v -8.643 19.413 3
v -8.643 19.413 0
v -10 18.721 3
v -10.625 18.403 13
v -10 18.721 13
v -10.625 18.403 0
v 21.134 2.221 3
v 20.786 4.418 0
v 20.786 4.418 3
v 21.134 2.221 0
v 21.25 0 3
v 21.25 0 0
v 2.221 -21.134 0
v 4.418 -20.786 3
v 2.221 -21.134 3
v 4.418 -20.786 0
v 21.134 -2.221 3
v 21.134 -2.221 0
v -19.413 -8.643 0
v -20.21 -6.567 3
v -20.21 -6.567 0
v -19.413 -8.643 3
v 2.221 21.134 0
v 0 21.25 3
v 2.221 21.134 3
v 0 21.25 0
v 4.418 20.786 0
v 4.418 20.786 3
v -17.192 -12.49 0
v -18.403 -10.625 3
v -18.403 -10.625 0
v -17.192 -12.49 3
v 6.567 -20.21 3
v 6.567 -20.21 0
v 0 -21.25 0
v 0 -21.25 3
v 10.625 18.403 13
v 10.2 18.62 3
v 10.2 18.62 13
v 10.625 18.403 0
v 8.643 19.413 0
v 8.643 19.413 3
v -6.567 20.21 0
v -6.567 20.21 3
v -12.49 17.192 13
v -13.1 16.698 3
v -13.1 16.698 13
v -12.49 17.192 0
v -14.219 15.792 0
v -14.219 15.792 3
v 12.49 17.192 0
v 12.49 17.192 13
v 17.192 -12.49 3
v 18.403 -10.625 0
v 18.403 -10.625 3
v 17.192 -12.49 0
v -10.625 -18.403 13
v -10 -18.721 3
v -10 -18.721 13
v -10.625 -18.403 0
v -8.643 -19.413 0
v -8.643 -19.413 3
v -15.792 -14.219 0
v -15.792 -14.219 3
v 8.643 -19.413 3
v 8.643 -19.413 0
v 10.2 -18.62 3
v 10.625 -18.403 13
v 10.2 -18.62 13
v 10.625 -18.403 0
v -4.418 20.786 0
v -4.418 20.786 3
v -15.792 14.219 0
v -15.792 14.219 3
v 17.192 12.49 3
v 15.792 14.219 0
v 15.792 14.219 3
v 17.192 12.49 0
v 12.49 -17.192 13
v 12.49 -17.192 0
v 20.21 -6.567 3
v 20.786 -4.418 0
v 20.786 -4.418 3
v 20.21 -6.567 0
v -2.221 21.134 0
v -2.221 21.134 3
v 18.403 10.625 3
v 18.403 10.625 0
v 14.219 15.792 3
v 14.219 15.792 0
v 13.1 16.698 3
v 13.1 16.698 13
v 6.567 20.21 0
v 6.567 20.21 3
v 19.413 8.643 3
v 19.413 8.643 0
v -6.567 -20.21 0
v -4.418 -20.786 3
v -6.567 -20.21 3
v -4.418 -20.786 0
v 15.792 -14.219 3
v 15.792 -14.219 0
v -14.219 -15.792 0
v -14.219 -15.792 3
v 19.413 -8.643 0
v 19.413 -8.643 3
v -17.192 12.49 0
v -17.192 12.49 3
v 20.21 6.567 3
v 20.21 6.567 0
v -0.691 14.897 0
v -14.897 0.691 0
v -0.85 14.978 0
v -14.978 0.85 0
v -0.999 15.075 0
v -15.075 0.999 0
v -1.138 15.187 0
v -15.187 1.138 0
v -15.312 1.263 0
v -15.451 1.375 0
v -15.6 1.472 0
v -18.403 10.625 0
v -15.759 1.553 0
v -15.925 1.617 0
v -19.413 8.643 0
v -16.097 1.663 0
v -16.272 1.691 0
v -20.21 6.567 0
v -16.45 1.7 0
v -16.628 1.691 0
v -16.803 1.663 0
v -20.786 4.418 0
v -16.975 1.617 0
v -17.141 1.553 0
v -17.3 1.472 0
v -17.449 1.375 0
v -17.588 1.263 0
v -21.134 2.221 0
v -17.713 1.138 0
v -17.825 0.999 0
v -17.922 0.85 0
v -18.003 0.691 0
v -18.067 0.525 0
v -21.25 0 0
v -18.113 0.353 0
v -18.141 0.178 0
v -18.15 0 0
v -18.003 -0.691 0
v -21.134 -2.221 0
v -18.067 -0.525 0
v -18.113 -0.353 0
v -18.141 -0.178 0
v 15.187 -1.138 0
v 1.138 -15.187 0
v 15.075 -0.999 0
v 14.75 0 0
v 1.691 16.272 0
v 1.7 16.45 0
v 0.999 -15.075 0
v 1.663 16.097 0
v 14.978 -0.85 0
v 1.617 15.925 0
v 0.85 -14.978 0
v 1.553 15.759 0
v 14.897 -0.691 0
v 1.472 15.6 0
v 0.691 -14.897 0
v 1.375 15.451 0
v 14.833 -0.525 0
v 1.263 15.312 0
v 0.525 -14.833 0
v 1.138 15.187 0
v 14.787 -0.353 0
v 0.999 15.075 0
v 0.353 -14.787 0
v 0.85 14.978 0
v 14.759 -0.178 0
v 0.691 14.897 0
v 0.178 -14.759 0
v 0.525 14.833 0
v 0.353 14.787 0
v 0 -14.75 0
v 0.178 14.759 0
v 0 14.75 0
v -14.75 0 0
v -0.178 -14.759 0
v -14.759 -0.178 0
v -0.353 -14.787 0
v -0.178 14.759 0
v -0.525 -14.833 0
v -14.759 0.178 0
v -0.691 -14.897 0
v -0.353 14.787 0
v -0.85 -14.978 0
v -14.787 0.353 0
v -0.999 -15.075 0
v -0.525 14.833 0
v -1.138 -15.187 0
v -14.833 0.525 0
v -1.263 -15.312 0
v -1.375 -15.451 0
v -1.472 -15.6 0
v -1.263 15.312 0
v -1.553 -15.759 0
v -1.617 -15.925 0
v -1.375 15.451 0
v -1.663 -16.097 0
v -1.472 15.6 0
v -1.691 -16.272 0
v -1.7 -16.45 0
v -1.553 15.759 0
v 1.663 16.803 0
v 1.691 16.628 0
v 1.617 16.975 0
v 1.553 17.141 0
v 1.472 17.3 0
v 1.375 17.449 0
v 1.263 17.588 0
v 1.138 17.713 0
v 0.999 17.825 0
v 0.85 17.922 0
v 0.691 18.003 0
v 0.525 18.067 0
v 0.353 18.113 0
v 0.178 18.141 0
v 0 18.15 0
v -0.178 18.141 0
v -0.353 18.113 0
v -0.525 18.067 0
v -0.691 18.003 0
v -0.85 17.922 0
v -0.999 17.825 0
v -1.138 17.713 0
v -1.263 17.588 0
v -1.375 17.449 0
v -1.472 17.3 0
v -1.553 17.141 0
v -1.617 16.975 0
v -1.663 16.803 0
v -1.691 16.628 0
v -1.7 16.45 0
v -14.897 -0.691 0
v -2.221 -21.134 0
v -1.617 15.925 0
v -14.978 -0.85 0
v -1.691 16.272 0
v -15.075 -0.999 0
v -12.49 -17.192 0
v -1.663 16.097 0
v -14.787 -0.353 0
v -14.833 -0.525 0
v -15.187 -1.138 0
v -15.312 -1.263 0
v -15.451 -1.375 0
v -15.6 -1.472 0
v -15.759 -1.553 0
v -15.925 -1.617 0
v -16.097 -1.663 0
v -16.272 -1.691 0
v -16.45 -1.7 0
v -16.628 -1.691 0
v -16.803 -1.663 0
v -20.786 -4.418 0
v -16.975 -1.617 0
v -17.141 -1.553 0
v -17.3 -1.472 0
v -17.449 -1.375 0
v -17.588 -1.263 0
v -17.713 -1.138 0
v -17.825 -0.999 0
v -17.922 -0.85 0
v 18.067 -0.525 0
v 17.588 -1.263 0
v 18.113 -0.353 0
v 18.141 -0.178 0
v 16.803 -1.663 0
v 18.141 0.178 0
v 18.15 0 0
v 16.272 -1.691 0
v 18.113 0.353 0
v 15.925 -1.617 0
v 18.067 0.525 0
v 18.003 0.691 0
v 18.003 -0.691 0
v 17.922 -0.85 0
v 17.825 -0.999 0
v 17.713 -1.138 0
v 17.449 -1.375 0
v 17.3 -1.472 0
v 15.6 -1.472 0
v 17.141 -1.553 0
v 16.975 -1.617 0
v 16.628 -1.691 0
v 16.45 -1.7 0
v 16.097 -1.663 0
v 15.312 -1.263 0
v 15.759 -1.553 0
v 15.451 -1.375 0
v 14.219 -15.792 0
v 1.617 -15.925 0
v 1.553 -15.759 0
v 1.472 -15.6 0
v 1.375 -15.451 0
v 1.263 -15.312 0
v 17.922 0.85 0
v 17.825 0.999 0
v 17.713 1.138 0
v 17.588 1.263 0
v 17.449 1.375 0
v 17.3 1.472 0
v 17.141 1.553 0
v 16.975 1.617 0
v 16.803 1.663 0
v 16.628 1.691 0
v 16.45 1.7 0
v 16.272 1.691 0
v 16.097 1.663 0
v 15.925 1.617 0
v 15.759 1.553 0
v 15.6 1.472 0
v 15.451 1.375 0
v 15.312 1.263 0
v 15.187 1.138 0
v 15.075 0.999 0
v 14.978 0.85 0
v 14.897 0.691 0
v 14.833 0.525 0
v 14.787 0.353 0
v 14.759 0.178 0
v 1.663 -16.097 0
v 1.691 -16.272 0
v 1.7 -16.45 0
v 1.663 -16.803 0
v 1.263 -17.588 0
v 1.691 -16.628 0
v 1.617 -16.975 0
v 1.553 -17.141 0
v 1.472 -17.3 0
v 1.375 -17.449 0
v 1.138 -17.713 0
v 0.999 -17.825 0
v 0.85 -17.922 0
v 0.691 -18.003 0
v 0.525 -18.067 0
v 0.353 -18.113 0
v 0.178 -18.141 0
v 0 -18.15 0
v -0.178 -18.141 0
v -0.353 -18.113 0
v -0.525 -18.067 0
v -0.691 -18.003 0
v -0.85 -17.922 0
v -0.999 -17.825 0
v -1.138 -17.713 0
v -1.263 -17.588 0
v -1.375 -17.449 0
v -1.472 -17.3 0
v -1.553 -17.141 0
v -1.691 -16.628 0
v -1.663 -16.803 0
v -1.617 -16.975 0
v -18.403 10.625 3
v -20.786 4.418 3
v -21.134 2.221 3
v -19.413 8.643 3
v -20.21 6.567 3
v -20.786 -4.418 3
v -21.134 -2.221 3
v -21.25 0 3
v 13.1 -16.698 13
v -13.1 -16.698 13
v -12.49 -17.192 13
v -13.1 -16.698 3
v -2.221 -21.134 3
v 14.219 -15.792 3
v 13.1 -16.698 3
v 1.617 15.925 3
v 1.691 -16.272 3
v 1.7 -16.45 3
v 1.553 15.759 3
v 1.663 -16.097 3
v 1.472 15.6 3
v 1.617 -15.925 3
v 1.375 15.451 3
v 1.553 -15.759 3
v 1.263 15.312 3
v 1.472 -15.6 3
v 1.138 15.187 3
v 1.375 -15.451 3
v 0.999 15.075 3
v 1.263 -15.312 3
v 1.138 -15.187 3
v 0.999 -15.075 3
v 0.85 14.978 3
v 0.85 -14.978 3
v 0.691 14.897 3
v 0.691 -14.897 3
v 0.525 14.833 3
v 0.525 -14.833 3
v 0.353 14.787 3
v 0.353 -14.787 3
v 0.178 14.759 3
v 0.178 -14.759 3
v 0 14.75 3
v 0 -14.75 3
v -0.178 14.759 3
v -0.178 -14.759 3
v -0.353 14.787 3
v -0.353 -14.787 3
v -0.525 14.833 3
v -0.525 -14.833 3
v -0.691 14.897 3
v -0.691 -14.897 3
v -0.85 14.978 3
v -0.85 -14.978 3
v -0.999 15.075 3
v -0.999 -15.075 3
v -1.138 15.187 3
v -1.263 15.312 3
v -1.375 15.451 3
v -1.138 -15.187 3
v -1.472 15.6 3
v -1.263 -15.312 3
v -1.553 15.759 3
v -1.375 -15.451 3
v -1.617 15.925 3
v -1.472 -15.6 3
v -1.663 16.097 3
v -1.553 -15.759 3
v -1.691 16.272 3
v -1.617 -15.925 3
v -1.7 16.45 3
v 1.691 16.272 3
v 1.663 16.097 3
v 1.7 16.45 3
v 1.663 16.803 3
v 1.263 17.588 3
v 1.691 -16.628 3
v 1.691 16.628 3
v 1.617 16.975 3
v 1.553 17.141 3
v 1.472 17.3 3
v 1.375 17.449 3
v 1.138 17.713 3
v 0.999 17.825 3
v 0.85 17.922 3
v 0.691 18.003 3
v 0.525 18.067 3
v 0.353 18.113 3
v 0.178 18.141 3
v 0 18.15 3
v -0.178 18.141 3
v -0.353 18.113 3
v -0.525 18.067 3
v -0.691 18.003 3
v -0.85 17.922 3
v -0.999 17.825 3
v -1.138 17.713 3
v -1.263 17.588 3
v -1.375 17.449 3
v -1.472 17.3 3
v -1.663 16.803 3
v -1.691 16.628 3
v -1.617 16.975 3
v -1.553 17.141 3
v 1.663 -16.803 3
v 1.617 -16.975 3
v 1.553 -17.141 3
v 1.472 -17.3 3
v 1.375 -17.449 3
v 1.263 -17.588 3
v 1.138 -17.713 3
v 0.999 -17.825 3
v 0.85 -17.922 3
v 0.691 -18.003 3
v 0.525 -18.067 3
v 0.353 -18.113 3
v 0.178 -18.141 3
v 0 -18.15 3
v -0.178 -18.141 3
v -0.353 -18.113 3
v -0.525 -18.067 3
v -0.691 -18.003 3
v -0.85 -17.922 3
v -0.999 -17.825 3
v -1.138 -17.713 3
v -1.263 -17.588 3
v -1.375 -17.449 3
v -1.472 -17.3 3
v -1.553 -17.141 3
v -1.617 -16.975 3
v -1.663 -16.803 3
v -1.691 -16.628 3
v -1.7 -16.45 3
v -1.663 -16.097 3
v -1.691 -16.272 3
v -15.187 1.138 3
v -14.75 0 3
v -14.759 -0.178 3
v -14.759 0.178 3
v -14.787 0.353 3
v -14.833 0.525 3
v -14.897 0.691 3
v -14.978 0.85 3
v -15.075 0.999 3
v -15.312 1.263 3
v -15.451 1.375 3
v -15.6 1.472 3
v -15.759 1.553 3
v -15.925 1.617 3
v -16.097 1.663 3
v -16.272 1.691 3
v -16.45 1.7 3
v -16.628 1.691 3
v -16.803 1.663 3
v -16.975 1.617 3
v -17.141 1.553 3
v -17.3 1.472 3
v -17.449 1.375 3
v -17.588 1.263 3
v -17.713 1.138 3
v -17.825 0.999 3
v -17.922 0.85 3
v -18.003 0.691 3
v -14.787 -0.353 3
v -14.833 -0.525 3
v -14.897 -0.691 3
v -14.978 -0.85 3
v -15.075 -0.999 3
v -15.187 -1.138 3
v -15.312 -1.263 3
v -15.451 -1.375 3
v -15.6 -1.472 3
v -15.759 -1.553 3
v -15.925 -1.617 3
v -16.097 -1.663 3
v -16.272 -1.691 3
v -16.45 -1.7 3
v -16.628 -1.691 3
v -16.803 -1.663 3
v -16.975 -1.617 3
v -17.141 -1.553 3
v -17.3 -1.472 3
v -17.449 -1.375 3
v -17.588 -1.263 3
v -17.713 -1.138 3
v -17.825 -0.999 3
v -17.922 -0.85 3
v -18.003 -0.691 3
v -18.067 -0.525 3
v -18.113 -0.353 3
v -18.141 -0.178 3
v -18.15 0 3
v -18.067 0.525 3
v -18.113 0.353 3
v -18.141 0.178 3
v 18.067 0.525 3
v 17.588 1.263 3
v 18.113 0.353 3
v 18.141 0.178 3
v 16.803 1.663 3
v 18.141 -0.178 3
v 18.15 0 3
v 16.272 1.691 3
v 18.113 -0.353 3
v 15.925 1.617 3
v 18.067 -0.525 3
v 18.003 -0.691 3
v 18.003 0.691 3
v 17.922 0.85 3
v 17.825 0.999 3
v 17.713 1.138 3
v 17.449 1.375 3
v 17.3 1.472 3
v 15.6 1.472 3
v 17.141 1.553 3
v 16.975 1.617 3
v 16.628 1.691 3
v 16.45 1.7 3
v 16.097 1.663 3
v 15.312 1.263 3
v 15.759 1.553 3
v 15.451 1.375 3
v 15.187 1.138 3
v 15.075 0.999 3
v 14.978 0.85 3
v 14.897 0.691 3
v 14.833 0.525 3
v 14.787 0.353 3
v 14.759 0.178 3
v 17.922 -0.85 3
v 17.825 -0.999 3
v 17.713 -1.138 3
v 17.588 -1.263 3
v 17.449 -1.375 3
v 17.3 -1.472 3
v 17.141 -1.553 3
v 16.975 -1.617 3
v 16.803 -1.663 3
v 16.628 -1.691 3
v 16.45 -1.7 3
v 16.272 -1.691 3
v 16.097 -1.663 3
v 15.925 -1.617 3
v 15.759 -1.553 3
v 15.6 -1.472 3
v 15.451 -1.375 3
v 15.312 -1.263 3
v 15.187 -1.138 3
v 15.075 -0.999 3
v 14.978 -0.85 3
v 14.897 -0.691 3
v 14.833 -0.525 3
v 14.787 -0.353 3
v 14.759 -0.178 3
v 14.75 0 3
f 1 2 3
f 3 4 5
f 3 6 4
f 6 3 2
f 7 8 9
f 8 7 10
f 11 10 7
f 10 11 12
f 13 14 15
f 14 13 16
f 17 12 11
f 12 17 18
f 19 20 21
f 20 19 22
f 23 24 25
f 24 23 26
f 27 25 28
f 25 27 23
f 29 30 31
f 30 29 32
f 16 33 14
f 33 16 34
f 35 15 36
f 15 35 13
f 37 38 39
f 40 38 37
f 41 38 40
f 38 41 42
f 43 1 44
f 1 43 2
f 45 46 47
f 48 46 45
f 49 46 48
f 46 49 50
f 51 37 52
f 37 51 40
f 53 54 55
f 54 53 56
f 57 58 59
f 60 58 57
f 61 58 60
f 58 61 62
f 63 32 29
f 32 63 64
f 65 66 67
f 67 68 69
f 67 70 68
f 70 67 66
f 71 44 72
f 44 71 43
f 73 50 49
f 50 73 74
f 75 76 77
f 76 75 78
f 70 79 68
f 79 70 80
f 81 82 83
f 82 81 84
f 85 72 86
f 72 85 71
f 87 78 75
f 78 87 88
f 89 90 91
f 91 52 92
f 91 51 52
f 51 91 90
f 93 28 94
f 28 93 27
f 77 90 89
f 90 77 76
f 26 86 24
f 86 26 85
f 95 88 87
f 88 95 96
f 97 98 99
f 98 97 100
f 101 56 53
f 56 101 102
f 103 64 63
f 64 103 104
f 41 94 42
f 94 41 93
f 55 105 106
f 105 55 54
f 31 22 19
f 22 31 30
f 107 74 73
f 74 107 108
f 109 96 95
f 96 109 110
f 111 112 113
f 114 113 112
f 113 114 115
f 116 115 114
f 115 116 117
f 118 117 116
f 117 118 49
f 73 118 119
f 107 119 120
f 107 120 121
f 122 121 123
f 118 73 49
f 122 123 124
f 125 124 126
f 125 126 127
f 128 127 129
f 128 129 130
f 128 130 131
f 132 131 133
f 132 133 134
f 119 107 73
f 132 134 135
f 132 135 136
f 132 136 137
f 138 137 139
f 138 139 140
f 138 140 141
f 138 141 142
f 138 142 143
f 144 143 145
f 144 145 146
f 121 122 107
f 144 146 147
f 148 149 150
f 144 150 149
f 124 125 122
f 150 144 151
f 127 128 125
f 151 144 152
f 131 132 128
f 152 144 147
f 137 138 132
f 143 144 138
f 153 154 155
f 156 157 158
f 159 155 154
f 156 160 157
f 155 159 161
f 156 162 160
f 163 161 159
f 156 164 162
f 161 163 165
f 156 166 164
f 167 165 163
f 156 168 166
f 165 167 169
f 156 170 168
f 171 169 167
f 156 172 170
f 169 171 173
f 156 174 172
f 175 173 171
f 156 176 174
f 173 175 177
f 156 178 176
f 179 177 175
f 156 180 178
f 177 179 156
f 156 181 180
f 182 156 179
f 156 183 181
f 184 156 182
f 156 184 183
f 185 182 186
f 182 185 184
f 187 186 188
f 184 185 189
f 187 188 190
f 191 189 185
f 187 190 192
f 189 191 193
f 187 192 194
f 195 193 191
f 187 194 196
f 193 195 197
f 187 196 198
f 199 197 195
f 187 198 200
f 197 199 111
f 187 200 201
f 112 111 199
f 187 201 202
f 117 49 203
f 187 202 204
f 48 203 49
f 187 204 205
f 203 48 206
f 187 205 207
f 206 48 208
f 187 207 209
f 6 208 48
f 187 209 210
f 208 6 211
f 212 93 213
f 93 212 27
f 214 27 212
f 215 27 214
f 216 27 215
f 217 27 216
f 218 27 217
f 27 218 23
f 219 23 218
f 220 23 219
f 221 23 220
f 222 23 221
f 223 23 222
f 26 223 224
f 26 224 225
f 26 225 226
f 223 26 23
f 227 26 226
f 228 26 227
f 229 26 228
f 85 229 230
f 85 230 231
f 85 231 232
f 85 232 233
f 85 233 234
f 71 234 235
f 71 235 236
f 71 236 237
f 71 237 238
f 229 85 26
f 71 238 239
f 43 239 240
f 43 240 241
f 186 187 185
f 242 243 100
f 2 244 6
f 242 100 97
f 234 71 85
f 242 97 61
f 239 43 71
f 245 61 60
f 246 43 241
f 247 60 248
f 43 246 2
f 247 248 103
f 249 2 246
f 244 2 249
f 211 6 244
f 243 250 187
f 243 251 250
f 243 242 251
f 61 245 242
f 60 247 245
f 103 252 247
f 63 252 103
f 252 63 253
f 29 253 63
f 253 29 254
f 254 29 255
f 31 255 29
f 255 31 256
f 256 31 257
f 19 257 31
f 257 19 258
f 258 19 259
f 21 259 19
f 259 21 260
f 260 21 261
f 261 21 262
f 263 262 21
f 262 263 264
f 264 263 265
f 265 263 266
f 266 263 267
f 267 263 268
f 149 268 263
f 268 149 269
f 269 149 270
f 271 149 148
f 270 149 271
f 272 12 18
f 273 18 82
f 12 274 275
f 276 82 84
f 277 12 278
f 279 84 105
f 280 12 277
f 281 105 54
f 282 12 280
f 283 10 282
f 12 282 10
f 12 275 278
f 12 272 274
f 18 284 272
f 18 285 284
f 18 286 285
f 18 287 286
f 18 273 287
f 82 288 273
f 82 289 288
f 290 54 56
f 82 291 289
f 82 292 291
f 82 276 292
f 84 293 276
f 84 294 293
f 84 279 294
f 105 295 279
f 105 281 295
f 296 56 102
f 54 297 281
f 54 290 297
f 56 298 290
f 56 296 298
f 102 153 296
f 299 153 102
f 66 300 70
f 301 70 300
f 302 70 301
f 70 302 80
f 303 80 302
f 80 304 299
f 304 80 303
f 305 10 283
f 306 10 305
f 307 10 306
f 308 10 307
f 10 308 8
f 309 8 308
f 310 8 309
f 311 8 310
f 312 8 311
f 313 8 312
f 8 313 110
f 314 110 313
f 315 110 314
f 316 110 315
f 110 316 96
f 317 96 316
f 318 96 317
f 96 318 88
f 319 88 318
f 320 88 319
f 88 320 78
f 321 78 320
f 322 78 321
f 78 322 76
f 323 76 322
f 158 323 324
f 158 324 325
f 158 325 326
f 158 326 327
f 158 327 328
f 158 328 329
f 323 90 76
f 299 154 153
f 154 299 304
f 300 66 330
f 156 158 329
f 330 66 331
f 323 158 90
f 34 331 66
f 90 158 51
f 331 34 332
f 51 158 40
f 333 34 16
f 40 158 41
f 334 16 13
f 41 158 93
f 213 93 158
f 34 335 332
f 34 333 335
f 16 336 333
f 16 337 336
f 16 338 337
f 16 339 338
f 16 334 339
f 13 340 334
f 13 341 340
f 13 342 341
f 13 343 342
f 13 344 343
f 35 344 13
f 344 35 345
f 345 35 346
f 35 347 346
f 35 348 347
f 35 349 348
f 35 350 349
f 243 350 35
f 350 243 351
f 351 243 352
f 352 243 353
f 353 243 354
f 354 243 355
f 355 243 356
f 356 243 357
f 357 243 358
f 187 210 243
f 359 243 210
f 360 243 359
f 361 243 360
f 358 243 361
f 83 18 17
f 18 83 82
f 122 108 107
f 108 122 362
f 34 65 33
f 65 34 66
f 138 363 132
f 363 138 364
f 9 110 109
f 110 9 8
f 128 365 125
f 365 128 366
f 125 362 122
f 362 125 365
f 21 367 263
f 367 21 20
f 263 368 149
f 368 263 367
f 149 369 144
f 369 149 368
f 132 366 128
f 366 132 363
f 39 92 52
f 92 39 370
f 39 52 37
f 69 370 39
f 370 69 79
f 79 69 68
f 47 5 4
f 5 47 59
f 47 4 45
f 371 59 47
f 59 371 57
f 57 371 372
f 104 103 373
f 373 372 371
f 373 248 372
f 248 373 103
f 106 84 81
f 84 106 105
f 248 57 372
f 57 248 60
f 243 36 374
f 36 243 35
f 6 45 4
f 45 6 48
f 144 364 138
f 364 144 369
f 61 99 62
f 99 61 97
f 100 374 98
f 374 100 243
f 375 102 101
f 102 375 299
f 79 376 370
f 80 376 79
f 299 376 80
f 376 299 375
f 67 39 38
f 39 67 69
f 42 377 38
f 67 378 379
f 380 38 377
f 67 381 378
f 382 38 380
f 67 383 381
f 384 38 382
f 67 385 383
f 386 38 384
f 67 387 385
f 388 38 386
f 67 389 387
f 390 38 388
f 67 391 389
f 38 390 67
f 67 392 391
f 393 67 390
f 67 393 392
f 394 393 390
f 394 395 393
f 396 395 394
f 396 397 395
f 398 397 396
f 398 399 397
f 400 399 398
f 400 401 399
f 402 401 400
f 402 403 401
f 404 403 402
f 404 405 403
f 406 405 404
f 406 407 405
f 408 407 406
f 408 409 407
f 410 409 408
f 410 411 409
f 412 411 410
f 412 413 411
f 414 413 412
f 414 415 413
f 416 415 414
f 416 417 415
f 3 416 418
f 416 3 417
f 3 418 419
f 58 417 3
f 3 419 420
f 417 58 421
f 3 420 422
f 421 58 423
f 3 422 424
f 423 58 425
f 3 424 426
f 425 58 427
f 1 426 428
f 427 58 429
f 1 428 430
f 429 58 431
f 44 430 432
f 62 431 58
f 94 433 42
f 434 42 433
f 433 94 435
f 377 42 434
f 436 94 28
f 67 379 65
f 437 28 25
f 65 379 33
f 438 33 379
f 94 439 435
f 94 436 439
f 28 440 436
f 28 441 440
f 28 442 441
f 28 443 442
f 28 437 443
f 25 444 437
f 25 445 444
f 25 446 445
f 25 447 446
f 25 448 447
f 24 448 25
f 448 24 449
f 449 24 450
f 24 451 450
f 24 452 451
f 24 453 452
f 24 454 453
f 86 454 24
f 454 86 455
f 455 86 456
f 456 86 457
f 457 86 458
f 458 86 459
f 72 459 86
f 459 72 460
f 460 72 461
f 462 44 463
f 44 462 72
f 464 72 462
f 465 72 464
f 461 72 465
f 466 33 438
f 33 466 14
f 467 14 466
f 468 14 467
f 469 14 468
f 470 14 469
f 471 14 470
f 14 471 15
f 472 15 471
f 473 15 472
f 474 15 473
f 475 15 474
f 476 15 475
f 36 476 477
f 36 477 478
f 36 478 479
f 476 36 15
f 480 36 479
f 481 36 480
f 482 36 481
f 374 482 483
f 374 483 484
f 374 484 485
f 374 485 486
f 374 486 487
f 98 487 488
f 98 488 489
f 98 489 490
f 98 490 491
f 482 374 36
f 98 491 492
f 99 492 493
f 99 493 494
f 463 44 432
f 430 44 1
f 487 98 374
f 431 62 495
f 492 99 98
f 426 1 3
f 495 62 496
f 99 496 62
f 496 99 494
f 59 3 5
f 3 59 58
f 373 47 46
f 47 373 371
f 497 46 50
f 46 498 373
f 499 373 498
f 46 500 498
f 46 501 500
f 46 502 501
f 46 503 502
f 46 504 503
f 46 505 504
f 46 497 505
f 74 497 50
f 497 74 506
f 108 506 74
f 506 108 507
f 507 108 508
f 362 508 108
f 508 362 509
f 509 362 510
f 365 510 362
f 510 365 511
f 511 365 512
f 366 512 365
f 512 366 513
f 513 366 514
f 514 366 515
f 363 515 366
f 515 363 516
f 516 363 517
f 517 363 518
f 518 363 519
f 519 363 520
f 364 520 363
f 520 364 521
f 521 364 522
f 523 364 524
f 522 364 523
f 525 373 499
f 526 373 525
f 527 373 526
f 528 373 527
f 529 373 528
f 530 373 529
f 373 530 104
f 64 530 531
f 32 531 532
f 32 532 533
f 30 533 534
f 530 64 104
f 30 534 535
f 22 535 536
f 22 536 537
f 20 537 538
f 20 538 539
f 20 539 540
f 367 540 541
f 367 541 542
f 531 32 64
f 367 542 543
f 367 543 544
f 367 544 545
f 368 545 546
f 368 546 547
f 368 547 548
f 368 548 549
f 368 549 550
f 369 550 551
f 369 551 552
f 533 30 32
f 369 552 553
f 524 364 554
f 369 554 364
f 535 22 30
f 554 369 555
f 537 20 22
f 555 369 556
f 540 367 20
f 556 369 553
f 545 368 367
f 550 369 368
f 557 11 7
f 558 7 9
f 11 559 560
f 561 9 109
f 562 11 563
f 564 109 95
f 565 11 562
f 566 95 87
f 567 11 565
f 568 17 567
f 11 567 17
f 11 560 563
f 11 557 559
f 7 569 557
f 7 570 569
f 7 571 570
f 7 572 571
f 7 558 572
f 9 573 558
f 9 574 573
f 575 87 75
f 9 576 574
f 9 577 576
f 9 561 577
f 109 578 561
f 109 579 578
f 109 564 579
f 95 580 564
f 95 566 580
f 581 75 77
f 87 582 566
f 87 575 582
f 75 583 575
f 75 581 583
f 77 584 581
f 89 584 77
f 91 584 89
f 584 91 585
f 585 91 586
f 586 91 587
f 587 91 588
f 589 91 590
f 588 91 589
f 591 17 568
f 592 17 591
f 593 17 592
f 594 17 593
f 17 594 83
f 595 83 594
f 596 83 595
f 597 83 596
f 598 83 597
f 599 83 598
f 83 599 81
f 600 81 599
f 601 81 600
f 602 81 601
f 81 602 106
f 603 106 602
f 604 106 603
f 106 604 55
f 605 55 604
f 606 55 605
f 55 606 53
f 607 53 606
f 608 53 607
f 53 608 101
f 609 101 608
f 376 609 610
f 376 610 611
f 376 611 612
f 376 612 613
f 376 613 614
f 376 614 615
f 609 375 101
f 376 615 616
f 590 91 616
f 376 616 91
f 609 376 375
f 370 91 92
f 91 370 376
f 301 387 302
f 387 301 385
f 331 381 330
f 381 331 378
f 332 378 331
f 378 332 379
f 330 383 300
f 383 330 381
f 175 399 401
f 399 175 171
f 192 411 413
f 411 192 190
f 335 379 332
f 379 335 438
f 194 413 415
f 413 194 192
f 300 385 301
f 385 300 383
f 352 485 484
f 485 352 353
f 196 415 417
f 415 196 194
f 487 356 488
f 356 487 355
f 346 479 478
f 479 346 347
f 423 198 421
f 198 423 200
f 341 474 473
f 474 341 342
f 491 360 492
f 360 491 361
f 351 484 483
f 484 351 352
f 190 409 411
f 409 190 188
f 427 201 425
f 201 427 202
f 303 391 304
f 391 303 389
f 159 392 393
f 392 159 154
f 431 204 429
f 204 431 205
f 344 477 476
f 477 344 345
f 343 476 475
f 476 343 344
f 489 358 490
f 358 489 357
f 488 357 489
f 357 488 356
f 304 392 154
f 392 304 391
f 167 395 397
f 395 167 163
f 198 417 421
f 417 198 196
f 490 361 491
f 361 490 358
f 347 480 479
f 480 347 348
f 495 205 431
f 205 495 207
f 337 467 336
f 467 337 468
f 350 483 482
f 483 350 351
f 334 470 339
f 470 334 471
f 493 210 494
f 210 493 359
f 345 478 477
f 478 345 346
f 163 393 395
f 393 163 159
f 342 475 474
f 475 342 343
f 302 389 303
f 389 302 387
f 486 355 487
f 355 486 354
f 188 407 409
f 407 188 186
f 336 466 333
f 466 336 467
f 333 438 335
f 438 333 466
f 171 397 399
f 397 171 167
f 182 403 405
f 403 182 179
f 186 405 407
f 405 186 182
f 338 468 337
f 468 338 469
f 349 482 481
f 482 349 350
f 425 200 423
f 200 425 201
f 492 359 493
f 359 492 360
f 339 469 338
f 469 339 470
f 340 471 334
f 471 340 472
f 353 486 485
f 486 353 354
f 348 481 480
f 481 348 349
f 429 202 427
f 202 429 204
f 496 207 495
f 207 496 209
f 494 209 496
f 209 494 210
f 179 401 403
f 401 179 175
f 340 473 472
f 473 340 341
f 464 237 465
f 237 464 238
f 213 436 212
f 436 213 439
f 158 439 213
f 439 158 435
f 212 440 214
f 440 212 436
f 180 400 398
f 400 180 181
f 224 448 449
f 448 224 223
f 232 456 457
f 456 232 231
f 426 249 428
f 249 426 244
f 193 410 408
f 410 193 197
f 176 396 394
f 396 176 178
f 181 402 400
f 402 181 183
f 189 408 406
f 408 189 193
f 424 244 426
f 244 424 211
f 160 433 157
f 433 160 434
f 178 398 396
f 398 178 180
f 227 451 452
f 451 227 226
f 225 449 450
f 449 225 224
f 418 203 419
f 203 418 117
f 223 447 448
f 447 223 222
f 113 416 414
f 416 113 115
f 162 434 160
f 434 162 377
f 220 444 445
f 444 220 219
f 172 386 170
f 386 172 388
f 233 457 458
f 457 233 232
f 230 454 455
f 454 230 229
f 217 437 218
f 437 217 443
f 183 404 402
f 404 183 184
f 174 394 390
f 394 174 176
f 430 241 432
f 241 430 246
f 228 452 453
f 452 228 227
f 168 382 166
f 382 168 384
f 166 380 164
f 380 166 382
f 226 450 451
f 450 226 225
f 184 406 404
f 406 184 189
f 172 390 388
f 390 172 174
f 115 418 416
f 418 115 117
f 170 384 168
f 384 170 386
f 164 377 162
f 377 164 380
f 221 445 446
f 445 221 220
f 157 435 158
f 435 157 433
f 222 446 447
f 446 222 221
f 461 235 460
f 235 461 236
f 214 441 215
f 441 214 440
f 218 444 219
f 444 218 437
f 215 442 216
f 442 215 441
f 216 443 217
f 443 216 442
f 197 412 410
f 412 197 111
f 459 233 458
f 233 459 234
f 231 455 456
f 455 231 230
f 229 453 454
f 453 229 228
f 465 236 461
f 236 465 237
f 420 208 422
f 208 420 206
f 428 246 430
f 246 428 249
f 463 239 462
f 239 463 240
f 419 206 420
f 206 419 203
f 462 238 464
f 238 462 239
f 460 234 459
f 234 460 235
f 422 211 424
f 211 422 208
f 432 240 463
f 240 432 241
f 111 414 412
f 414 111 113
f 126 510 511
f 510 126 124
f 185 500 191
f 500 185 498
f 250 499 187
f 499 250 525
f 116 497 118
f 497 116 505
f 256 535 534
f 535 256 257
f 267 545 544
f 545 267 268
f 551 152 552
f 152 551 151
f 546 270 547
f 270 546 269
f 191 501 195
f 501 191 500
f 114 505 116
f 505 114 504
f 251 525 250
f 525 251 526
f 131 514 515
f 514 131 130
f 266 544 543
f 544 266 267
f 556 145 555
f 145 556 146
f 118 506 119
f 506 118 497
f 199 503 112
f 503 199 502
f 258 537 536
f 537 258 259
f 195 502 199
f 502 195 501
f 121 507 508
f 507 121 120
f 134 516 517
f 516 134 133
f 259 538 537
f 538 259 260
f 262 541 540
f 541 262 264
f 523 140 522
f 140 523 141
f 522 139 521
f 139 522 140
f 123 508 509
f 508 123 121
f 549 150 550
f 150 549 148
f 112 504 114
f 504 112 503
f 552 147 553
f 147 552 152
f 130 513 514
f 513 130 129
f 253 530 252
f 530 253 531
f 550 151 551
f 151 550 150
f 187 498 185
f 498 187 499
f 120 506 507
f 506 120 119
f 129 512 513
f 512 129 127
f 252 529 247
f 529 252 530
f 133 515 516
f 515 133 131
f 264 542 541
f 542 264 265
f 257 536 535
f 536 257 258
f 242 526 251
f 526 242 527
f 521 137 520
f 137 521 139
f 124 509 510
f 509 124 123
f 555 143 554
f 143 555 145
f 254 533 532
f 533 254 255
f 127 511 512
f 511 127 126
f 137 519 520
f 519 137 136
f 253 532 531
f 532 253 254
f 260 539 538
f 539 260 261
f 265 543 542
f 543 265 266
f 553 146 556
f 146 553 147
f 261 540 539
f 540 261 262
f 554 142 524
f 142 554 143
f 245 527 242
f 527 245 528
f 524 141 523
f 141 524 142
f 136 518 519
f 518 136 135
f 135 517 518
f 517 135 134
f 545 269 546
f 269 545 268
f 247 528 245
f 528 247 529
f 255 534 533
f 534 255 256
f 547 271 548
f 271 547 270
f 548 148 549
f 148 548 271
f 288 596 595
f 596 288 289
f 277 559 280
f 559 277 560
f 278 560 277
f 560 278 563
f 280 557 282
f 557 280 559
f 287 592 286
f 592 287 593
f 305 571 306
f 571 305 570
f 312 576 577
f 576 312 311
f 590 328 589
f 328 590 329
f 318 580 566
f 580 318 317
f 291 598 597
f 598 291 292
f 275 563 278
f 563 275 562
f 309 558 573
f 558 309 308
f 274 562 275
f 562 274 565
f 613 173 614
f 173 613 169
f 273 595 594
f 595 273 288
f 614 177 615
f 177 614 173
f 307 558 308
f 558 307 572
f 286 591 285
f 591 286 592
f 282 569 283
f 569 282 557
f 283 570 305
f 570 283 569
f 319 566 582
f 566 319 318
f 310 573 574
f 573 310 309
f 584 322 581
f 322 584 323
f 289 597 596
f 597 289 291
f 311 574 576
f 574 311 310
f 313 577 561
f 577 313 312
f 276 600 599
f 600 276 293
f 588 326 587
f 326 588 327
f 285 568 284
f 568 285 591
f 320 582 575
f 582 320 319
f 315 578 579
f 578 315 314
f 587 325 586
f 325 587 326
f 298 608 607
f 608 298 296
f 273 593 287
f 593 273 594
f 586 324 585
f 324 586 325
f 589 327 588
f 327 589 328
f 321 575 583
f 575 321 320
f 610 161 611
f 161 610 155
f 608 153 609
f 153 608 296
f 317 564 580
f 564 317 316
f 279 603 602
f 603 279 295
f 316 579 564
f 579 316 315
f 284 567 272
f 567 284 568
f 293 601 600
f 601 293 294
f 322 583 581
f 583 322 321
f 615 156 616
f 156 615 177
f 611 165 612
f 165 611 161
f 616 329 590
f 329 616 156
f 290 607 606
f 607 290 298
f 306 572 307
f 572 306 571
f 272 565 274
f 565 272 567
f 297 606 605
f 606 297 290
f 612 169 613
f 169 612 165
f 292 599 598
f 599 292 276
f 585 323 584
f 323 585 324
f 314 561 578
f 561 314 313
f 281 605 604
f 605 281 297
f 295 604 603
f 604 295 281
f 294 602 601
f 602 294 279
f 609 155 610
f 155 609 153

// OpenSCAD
tube_thickness=20.2;
support_wall_thickness=3;
plate_diameter=42.5;
difference(){
cylinder(r=(plate_diameter/2),h=13,$fn=60);
translate([-10,-plate_diameter/2,3]) cube([tube_thickness,plate_diameter,20],centre=true);
translate([-(plate_diameter/2),-plate_diameter/2,3]) cube([((plate_diameter/2)-(tube_thickness/2+support_wall_thickness)),plate_diameter,20]);
translate([((plate_diameter/2)-((plate_diameter/2)-(tube_thickness/2+support_wall_thickness))),-plate_diameter/2,3]) cube([((plate_diameter/2)-(tube_thickness/2+support_wall_thickness)),plate_diameter,20]);
//mounting holes //
translate([0,-(42.5/2)+4.8,0]) cylinder(r=1.7,h=3,$fn=60);
translate([0,(42.5/2)-4.8,0]) cylinder(r=1.7,h=3,$fn=60);
translate([-(42.5/2)+4.8,0,0]) cylinder(r=1.7,h=3,$fn=60);
translate([(42.5/2)-4.8,0,0]) cylinder(r=1.7,h=3,$fn=60);
}
